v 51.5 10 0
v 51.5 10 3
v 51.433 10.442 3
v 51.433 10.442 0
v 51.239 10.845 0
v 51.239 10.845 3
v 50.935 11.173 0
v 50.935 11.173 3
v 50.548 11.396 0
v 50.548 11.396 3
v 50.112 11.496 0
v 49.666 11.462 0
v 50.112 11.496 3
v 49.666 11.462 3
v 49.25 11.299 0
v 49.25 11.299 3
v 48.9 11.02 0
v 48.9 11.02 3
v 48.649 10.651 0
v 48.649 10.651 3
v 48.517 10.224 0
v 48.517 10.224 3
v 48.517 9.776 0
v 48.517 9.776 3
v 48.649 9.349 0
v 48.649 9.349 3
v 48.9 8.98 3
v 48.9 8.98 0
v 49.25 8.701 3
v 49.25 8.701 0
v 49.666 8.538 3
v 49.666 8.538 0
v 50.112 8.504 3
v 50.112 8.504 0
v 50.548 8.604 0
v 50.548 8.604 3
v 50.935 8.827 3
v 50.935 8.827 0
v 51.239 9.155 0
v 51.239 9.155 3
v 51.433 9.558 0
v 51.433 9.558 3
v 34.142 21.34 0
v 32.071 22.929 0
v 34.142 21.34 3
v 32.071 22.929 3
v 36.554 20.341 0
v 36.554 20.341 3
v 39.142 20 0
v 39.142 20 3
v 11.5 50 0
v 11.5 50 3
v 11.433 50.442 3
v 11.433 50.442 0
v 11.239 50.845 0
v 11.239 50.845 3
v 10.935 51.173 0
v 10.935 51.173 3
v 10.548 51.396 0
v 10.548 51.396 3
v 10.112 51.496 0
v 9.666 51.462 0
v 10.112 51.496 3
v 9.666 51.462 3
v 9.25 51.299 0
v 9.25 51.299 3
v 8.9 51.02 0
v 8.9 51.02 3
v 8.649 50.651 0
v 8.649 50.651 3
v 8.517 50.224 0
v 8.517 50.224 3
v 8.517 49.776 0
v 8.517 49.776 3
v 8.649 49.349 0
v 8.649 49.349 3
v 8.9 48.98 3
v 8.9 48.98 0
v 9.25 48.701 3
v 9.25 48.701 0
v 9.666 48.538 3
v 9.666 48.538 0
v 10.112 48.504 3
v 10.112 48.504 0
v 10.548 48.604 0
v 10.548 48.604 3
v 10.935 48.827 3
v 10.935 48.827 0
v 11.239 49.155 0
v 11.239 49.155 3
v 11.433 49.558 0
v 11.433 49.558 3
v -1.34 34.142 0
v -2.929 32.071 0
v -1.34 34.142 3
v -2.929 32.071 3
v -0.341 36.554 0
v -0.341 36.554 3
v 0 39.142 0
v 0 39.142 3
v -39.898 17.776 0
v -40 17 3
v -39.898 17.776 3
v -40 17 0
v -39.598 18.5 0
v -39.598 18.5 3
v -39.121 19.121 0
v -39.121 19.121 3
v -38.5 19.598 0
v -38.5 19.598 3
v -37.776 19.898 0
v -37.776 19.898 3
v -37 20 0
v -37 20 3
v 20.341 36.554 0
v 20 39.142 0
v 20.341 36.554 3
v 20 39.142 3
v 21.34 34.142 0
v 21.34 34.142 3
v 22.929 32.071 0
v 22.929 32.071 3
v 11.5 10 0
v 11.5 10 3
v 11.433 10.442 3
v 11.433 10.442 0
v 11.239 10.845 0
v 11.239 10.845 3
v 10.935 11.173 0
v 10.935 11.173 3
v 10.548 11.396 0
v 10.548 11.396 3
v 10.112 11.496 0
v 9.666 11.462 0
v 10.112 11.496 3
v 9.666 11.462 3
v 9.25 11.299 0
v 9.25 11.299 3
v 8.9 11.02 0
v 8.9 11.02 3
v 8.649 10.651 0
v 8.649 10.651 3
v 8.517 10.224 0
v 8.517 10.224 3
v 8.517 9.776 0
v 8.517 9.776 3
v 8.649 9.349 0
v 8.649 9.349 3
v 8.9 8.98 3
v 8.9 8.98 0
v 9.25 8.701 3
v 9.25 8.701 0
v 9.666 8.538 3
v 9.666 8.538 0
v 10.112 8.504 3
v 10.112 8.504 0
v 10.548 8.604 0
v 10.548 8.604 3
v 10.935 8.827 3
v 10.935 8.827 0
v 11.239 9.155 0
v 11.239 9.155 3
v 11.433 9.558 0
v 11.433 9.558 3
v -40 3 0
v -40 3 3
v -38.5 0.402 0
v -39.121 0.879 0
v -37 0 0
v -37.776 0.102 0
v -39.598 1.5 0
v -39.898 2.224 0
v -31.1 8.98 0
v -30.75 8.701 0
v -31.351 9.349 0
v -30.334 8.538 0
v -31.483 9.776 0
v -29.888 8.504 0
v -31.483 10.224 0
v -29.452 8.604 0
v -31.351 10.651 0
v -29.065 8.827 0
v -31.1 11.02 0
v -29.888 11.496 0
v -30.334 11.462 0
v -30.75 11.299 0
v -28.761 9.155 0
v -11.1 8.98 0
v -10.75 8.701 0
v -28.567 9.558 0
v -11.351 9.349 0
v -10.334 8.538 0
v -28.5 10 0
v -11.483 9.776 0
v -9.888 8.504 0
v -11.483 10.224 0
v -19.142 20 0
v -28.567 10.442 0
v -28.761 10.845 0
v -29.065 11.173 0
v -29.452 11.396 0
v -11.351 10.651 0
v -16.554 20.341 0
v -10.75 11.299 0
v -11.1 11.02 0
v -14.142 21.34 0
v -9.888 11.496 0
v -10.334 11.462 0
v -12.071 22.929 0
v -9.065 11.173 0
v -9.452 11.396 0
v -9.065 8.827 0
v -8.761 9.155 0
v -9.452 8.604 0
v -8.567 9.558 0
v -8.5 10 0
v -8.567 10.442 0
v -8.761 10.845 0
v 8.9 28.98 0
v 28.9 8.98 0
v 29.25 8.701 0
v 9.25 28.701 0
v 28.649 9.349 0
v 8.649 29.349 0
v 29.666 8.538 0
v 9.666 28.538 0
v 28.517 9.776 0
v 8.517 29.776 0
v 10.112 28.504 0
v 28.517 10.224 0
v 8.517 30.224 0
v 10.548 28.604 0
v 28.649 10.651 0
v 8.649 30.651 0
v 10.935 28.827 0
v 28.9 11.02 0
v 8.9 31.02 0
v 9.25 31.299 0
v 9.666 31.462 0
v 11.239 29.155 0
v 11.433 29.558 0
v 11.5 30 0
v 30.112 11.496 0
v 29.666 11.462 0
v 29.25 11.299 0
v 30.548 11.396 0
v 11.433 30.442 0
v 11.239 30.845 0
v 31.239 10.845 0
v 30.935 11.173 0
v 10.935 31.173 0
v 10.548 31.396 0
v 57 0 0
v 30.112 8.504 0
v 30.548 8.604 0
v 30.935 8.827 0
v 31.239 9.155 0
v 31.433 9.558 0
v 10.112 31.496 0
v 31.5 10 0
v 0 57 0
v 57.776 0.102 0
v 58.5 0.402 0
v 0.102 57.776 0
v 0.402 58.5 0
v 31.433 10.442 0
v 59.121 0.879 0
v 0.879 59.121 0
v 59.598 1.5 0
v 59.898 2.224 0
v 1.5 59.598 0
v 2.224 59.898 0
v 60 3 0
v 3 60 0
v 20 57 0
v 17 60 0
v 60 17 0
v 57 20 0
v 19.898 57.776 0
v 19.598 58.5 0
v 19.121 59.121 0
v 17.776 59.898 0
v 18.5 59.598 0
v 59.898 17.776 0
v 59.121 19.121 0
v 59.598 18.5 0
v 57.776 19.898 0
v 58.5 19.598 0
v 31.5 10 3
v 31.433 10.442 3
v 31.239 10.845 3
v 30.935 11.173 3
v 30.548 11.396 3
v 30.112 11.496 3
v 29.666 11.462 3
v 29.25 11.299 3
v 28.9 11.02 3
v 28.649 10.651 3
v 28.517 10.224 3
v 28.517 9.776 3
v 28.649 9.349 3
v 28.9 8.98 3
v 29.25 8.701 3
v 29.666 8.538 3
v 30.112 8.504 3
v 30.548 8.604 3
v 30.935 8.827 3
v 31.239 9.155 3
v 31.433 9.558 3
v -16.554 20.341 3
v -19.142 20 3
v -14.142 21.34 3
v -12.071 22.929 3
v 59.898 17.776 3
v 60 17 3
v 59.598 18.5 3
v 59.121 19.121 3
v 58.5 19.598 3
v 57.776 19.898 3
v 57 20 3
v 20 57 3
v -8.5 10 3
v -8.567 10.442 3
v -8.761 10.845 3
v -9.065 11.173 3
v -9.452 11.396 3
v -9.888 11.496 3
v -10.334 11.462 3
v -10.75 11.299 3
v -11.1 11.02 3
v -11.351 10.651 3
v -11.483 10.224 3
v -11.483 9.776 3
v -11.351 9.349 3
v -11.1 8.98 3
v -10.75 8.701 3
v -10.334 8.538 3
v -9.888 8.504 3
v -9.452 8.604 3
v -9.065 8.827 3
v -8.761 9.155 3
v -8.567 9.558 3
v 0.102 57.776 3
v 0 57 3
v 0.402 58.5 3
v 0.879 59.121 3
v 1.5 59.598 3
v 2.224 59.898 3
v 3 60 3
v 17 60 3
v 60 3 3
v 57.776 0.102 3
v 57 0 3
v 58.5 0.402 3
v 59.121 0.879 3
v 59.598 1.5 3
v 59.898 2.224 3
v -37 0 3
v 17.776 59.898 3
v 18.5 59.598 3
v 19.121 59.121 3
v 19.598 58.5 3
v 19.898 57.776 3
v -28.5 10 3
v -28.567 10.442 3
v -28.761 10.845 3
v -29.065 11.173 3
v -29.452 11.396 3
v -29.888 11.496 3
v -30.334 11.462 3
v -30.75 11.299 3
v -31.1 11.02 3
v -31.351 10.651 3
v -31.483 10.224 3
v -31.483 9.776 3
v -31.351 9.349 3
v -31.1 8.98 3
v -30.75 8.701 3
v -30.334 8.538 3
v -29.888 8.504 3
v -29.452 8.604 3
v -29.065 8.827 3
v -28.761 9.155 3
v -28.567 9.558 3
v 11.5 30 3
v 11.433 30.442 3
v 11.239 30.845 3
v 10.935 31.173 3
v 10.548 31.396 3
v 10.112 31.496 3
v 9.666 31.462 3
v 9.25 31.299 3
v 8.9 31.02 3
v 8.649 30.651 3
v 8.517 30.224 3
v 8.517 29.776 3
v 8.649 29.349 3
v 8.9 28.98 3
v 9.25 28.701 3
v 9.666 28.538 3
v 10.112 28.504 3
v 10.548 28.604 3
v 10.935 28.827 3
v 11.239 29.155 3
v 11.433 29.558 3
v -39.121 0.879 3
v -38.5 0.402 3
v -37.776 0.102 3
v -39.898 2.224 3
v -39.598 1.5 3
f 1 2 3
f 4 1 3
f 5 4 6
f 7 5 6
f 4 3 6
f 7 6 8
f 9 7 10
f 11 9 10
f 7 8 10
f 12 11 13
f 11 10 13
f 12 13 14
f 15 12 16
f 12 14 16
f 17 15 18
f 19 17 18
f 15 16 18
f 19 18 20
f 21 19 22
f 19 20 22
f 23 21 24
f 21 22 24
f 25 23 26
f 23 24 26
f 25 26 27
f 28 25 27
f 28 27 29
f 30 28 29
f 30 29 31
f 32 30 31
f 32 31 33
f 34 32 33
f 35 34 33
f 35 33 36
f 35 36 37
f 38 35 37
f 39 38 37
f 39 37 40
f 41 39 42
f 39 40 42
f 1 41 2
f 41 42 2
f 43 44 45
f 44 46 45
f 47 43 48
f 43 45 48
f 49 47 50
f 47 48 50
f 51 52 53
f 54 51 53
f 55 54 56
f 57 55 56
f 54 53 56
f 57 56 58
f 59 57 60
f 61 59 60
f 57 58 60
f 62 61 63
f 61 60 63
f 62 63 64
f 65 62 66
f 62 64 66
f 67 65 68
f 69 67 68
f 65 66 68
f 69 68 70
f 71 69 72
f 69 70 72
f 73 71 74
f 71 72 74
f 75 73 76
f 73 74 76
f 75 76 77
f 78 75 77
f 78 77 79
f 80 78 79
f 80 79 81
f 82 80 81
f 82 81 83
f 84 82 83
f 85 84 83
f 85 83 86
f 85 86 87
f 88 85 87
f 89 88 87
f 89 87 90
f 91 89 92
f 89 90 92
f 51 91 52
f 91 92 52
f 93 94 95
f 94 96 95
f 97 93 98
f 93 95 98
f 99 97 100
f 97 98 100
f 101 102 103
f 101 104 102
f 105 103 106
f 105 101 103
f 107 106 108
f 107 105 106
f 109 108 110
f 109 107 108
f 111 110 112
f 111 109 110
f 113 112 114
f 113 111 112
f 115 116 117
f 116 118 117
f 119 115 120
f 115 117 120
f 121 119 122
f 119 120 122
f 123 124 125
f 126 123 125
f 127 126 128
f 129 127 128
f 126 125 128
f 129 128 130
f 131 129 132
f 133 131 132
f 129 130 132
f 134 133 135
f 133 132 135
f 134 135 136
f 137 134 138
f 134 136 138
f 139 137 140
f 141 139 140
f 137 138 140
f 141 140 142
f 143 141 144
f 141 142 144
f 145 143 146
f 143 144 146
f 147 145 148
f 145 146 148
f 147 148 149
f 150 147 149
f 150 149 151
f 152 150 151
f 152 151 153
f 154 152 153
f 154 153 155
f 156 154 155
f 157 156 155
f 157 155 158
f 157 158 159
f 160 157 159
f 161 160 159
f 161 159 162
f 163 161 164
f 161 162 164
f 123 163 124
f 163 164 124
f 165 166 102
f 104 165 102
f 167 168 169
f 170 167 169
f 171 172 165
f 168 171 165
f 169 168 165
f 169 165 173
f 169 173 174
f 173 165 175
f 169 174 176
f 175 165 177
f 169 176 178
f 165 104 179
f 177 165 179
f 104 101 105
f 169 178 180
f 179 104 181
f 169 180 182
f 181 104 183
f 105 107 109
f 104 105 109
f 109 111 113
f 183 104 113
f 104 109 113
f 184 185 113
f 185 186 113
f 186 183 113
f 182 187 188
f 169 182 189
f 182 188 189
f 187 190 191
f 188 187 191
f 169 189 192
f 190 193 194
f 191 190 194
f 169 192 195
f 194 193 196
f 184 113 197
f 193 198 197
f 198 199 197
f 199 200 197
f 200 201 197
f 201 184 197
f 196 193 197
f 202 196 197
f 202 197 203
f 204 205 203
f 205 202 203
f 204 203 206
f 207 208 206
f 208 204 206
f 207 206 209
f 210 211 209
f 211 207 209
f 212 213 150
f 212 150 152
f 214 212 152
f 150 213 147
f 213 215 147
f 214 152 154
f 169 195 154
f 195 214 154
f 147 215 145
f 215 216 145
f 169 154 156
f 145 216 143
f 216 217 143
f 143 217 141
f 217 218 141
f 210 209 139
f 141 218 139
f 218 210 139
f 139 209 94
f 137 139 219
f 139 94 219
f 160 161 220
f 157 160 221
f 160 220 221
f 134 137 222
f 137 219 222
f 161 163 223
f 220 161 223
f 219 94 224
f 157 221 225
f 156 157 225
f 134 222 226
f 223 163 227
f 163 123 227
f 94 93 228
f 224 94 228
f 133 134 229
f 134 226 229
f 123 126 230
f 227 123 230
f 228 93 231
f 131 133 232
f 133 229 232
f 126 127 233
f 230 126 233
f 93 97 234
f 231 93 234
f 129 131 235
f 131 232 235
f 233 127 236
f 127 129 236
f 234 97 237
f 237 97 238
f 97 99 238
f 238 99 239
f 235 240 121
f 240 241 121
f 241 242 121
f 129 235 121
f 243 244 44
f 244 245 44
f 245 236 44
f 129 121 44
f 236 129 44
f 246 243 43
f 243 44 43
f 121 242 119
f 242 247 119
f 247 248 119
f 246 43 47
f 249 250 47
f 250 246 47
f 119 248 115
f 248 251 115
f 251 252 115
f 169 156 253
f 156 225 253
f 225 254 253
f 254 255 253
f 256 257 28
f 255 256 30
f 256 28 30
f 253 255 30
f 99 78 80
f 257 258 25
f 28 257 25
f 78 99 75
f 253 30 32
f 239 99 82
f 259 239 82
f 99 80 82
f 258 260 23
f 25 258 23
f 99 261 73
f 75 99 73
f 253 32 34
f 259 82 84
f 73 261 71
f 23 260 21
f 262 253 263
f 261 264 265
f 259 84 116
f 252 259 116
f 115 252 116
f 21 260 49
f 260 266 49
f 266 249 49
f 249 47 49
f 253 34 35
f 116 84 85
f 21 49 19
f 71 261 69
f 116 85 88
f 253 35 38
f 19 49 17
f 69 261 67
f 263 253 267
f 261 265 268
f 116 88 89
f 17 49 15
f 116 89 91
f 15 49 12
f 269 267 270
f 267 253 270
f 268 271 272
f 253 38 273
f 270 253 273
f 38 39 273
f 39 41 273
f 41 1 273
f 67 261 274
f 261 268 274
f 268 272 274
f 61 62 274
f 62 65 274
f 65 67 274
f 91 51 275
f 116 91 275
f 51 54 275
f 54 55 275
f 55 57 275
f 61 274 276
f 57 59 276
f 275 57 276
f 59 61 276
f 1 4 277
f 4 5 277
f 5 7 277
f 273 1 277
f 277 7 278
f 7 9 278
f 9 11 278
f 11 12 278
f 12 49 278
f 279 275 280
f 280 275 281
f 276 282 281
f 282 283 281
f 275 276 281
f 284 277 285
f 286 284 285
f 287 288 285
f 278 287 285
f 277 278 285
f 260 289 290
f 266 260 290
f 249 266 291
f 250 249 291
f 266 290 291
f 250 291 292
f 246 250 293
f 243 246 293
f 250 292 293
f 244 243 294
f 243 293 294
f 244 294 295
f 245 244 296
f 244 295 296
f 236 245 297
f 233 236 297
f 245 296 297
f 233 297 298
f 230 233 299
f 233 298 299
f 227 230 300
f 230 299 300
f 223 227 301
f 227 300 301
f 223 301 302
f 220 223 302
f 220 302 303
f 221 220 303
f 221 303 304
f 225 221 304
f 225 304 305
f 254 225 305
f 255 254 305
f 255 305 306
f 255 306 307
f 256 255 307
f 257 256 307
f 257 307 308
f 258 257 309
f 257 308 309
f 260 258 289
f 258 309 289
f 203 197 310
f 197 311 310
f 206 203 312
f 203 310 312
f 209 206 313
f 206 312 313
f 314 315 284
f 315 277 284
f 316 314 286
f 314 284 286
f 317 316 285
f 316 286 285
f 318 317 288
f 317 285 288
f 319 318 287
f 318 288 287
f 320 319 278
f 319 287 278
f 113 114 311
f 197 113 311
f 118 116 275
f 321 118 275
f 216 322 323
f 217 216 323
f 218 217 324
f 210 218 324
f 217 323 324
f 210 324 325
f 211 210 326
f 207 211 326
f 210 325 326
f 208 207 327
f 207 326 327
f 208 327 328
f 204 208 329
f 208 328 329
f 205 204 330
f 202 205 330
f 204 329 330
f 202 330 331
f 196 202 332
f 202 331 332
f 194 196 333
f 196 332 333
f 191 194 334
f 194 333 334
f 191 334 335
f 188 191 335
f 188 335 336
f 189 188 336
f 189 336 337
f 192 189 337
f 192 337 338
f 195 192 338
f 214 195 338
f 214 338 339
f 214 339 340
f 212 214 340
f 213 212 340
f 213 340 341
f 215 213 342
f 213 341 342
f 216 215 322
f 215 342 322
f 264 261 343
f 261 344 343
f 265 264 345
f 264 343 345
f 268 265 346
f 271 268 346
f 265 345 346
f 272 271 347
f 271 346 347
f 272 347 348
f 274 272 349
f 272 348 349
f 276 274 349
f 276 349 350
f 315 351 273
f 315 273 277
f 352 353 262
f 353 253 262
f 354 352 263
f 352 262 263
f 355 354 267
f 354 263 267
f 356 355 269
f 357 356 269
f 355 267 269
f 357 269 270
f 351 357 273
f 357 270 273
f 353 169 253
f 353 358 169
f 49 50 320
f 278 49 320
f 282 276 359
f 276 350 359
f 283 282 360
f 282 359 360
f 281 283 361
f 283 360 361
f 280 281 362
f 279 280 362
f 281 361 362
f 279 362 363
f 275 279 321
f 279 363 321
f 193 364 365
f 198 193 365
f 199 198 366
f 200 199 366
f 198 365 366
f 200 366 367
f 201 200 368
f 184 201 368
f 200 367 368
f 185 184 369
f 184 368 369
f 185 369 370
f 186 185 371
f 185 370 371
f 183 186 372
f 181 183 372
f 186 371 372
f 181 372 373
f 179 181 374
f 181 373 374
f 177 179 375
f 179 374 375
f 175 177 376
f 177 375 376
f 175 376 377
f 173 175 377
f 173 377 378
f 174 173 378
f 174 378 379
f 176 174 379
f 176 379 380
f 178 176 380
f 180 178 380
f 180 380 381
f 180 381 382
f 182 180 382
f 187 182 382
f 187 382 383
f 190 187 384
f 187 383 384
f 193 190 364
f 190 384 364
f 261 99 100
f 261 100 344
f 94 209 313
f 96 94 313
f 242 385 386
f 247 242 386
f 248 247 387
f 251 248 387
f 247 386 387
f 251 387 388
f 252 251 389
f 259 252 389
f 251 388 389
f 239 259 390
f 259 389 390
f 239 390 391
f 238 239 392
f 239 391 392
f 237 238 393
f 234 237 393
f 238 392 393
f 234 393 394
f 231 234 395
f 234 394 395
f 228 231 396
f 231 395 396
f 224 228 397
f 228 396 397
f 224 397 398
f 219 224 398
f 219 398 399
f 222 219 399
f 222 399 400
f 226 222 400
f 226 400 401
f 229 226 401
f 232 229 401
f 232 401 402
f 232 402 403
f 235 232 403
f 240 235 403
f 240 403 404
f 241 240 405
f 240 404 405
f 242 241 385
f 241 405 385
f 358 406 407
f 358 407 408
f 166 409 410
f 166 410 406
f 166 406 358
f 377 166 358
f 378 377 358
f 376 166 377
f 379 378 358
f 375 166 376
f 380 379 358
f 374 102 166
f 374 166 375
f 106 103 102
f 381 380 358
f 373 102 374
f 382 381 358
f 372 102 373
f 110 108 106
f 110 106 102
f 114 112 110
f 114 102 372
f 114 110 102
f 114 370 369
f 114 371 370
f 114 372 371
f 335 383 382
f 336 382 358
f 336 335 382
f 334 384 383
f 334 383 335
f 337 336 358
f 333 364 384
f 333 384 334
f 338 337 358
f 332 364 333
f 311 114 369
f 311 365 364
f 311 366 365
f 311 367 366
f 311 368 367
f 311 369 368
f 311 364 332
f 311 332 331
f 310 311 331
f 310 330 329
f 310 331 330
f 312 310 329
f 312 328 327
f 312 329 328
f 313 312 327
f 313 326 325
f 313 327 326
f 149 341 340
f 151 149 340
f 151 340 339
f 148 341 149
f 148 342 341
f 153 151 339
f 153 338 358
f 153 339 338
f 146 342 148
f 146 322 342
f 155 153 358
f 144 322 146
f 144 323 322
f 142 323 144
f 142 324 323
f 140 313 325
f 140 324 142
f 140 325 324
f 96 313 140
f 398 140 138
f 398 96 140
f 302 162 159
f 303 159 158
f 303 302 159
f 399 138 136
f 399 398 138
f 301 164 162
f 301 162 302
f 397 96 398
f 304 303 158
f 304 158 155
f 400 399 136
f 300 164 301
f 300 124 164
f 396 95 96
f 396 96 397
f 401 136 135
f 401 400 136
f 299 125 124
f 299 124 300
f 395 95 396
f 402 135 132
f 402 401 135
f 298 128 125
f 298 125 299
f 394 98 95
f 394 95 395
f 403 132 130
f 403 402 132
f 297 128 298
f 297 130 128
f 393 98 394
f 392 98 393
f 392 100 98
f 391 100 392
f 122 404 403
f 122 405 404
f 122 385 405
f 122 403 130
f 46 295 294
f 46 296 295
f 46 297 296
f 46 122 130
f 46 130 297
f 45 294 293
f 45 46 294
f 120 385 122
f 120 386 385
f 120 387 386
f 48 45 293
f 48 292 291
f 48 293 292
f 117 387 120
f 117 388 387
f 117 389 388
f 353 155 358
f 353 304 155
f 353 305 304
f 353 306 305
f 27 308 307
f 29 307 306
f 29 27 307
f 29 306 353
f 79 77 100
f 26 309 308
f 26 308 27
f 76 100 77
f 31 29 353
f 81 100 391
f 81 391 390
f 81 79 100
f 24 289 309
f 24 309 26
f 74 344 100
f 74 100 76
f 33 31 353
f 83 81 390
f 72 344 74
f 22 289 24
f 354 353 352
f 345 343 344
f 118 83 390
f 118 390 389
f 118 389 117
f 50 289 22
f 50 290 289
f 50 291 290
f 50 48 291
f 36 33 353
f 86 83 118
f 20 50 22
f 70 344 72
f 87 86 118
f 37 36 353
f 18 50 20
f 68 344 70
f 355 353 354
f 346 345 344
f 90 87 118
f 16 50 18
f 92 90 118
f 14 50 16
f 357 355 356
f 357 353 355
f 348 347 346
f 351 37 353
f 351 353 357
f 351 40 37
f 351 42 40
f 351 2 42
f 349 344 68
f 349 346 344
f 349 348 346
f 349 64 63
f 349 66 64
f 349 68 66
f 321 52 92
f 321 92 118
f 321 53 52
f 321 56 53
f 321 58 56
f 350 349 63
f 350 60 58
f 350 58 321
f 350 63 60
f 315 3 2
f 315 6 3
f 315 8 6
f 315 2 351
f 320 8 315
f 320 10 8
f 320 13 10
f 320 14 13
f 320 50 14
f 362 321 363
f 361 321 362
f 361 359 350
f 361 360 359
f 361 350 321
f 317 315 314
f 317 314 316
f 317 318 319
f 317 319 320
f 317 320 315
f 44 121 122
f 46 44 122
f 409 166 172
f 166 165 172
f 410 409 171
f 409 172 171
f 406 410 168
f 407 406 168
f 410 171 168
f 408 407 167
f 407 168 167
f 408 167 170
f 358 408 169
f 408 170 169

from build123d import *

# Parameters (mm, degrees)
SKETCH_1_W          = 20
SKETCH_1_H          = 60
EXTRUDE_1_DEPTH     = 3
SKETCH_2_W          = 60
SKETCH_2_H          = 20
EXTRUDE_2_DEPTH     = 3
SKETCH_3_W          = 60
SKETCH_3_H          = 20
EXTRUDE_3_DEPTH     = 3
SKETCH_4_R          = 1.5
CUT_EXTRUDE_1_DEPTH = 3
FILLET_2_R          = 3
CHAMFER_1_SIZE      = 15
FILLET_3_R          = 10


with BuildPart() as part:
    # 草图1 → 凸台-拉伸1 (new body)
    with BuildSketch(Plane.XY):
        with Locations((10, 30)):
            Rectangle(SKETCH_1_W, SKETCH_1_H)
    extrude(amount=EXTRUDE_1_DEPTH)

    # 草图2 → 凸台-拉伸2 (add)
    with BuildSketch(Plane.XY.offset(3)):
        with Locations((30, 10)):
            Rectangle(SKETCH_2_W, SKETCH_2_H)
    extrude(amount=-EXTRUDE_2_DEPTH)

    # 草图3 → 凸台-拉伸3 (add)
    with BuildSketch(Plane.XY.offset(3)):
        with Locations((-10, 10)):
            Rectangle(SKETCH_3_W, SKETCH_3_H)
    extrude(amount=-EXTRUDE_3_DEPTH)

    # 草图4 → 切除-拉伸1 (cut)
    with BuildSketch(Plane.XY.offset(3)):
        with Locations((10, 10)):
            Circle(SKETCH_4_R)
        with Locations((10, 30)):
            Circle(SKETCH_4_R)
        with Locations((10, 50)):
            Circle(SKETCH_4_R)
        with Locations((-30, 10)):
            Circle(SKETCH_4_R)
        with Locations((-10, 10)):
            Circle(SKETCH_4_R)
        with Locations((30, 10)):
            Circle(SKETCH_4_R)
        with Locations((50, 10)):
            Circle(SKETCH_4_R)
    extrude(amount=-CUT_EXTRUDE_1_DEPTH, mode=Mode.SUBTRACT)

    # 圆角2
    fillet_2_edges = [part.edges().sort_by_distance(p)[0] for p in [
        (60, 0, 1.5),
        (60, 20, 1.5),
        (-40, 20, 1.5),
        (-40, 0, 1.5),
        (0, 60, 1.5),
        (20, 60, 1.5),
    ]]
    fillet(fillet_2_edges, radius=FILLET_2_R)

    # 倒角1
    chamfer_1_edges = [part.edges().sort_by_distance(p)[0] for p in [
        (20, 20, 1.5),
        (0, 20, 1.5),
    ]]
    chamfer(chamfer_1_edges, length=CHAMFER_1_SIZE)

    # 圆角3
    fillet_3_edges = [part.edges().sort_by_distance(p)[0] for p in [
        (20, 35, 1.5),
        (35, 20, 1.5),
        (0, 35, 1.5),
        (-15, 20, 1.5),
    ]]
    fillet(fillet_3_edges, radius=FILLET_3_R)


solid = part.part
